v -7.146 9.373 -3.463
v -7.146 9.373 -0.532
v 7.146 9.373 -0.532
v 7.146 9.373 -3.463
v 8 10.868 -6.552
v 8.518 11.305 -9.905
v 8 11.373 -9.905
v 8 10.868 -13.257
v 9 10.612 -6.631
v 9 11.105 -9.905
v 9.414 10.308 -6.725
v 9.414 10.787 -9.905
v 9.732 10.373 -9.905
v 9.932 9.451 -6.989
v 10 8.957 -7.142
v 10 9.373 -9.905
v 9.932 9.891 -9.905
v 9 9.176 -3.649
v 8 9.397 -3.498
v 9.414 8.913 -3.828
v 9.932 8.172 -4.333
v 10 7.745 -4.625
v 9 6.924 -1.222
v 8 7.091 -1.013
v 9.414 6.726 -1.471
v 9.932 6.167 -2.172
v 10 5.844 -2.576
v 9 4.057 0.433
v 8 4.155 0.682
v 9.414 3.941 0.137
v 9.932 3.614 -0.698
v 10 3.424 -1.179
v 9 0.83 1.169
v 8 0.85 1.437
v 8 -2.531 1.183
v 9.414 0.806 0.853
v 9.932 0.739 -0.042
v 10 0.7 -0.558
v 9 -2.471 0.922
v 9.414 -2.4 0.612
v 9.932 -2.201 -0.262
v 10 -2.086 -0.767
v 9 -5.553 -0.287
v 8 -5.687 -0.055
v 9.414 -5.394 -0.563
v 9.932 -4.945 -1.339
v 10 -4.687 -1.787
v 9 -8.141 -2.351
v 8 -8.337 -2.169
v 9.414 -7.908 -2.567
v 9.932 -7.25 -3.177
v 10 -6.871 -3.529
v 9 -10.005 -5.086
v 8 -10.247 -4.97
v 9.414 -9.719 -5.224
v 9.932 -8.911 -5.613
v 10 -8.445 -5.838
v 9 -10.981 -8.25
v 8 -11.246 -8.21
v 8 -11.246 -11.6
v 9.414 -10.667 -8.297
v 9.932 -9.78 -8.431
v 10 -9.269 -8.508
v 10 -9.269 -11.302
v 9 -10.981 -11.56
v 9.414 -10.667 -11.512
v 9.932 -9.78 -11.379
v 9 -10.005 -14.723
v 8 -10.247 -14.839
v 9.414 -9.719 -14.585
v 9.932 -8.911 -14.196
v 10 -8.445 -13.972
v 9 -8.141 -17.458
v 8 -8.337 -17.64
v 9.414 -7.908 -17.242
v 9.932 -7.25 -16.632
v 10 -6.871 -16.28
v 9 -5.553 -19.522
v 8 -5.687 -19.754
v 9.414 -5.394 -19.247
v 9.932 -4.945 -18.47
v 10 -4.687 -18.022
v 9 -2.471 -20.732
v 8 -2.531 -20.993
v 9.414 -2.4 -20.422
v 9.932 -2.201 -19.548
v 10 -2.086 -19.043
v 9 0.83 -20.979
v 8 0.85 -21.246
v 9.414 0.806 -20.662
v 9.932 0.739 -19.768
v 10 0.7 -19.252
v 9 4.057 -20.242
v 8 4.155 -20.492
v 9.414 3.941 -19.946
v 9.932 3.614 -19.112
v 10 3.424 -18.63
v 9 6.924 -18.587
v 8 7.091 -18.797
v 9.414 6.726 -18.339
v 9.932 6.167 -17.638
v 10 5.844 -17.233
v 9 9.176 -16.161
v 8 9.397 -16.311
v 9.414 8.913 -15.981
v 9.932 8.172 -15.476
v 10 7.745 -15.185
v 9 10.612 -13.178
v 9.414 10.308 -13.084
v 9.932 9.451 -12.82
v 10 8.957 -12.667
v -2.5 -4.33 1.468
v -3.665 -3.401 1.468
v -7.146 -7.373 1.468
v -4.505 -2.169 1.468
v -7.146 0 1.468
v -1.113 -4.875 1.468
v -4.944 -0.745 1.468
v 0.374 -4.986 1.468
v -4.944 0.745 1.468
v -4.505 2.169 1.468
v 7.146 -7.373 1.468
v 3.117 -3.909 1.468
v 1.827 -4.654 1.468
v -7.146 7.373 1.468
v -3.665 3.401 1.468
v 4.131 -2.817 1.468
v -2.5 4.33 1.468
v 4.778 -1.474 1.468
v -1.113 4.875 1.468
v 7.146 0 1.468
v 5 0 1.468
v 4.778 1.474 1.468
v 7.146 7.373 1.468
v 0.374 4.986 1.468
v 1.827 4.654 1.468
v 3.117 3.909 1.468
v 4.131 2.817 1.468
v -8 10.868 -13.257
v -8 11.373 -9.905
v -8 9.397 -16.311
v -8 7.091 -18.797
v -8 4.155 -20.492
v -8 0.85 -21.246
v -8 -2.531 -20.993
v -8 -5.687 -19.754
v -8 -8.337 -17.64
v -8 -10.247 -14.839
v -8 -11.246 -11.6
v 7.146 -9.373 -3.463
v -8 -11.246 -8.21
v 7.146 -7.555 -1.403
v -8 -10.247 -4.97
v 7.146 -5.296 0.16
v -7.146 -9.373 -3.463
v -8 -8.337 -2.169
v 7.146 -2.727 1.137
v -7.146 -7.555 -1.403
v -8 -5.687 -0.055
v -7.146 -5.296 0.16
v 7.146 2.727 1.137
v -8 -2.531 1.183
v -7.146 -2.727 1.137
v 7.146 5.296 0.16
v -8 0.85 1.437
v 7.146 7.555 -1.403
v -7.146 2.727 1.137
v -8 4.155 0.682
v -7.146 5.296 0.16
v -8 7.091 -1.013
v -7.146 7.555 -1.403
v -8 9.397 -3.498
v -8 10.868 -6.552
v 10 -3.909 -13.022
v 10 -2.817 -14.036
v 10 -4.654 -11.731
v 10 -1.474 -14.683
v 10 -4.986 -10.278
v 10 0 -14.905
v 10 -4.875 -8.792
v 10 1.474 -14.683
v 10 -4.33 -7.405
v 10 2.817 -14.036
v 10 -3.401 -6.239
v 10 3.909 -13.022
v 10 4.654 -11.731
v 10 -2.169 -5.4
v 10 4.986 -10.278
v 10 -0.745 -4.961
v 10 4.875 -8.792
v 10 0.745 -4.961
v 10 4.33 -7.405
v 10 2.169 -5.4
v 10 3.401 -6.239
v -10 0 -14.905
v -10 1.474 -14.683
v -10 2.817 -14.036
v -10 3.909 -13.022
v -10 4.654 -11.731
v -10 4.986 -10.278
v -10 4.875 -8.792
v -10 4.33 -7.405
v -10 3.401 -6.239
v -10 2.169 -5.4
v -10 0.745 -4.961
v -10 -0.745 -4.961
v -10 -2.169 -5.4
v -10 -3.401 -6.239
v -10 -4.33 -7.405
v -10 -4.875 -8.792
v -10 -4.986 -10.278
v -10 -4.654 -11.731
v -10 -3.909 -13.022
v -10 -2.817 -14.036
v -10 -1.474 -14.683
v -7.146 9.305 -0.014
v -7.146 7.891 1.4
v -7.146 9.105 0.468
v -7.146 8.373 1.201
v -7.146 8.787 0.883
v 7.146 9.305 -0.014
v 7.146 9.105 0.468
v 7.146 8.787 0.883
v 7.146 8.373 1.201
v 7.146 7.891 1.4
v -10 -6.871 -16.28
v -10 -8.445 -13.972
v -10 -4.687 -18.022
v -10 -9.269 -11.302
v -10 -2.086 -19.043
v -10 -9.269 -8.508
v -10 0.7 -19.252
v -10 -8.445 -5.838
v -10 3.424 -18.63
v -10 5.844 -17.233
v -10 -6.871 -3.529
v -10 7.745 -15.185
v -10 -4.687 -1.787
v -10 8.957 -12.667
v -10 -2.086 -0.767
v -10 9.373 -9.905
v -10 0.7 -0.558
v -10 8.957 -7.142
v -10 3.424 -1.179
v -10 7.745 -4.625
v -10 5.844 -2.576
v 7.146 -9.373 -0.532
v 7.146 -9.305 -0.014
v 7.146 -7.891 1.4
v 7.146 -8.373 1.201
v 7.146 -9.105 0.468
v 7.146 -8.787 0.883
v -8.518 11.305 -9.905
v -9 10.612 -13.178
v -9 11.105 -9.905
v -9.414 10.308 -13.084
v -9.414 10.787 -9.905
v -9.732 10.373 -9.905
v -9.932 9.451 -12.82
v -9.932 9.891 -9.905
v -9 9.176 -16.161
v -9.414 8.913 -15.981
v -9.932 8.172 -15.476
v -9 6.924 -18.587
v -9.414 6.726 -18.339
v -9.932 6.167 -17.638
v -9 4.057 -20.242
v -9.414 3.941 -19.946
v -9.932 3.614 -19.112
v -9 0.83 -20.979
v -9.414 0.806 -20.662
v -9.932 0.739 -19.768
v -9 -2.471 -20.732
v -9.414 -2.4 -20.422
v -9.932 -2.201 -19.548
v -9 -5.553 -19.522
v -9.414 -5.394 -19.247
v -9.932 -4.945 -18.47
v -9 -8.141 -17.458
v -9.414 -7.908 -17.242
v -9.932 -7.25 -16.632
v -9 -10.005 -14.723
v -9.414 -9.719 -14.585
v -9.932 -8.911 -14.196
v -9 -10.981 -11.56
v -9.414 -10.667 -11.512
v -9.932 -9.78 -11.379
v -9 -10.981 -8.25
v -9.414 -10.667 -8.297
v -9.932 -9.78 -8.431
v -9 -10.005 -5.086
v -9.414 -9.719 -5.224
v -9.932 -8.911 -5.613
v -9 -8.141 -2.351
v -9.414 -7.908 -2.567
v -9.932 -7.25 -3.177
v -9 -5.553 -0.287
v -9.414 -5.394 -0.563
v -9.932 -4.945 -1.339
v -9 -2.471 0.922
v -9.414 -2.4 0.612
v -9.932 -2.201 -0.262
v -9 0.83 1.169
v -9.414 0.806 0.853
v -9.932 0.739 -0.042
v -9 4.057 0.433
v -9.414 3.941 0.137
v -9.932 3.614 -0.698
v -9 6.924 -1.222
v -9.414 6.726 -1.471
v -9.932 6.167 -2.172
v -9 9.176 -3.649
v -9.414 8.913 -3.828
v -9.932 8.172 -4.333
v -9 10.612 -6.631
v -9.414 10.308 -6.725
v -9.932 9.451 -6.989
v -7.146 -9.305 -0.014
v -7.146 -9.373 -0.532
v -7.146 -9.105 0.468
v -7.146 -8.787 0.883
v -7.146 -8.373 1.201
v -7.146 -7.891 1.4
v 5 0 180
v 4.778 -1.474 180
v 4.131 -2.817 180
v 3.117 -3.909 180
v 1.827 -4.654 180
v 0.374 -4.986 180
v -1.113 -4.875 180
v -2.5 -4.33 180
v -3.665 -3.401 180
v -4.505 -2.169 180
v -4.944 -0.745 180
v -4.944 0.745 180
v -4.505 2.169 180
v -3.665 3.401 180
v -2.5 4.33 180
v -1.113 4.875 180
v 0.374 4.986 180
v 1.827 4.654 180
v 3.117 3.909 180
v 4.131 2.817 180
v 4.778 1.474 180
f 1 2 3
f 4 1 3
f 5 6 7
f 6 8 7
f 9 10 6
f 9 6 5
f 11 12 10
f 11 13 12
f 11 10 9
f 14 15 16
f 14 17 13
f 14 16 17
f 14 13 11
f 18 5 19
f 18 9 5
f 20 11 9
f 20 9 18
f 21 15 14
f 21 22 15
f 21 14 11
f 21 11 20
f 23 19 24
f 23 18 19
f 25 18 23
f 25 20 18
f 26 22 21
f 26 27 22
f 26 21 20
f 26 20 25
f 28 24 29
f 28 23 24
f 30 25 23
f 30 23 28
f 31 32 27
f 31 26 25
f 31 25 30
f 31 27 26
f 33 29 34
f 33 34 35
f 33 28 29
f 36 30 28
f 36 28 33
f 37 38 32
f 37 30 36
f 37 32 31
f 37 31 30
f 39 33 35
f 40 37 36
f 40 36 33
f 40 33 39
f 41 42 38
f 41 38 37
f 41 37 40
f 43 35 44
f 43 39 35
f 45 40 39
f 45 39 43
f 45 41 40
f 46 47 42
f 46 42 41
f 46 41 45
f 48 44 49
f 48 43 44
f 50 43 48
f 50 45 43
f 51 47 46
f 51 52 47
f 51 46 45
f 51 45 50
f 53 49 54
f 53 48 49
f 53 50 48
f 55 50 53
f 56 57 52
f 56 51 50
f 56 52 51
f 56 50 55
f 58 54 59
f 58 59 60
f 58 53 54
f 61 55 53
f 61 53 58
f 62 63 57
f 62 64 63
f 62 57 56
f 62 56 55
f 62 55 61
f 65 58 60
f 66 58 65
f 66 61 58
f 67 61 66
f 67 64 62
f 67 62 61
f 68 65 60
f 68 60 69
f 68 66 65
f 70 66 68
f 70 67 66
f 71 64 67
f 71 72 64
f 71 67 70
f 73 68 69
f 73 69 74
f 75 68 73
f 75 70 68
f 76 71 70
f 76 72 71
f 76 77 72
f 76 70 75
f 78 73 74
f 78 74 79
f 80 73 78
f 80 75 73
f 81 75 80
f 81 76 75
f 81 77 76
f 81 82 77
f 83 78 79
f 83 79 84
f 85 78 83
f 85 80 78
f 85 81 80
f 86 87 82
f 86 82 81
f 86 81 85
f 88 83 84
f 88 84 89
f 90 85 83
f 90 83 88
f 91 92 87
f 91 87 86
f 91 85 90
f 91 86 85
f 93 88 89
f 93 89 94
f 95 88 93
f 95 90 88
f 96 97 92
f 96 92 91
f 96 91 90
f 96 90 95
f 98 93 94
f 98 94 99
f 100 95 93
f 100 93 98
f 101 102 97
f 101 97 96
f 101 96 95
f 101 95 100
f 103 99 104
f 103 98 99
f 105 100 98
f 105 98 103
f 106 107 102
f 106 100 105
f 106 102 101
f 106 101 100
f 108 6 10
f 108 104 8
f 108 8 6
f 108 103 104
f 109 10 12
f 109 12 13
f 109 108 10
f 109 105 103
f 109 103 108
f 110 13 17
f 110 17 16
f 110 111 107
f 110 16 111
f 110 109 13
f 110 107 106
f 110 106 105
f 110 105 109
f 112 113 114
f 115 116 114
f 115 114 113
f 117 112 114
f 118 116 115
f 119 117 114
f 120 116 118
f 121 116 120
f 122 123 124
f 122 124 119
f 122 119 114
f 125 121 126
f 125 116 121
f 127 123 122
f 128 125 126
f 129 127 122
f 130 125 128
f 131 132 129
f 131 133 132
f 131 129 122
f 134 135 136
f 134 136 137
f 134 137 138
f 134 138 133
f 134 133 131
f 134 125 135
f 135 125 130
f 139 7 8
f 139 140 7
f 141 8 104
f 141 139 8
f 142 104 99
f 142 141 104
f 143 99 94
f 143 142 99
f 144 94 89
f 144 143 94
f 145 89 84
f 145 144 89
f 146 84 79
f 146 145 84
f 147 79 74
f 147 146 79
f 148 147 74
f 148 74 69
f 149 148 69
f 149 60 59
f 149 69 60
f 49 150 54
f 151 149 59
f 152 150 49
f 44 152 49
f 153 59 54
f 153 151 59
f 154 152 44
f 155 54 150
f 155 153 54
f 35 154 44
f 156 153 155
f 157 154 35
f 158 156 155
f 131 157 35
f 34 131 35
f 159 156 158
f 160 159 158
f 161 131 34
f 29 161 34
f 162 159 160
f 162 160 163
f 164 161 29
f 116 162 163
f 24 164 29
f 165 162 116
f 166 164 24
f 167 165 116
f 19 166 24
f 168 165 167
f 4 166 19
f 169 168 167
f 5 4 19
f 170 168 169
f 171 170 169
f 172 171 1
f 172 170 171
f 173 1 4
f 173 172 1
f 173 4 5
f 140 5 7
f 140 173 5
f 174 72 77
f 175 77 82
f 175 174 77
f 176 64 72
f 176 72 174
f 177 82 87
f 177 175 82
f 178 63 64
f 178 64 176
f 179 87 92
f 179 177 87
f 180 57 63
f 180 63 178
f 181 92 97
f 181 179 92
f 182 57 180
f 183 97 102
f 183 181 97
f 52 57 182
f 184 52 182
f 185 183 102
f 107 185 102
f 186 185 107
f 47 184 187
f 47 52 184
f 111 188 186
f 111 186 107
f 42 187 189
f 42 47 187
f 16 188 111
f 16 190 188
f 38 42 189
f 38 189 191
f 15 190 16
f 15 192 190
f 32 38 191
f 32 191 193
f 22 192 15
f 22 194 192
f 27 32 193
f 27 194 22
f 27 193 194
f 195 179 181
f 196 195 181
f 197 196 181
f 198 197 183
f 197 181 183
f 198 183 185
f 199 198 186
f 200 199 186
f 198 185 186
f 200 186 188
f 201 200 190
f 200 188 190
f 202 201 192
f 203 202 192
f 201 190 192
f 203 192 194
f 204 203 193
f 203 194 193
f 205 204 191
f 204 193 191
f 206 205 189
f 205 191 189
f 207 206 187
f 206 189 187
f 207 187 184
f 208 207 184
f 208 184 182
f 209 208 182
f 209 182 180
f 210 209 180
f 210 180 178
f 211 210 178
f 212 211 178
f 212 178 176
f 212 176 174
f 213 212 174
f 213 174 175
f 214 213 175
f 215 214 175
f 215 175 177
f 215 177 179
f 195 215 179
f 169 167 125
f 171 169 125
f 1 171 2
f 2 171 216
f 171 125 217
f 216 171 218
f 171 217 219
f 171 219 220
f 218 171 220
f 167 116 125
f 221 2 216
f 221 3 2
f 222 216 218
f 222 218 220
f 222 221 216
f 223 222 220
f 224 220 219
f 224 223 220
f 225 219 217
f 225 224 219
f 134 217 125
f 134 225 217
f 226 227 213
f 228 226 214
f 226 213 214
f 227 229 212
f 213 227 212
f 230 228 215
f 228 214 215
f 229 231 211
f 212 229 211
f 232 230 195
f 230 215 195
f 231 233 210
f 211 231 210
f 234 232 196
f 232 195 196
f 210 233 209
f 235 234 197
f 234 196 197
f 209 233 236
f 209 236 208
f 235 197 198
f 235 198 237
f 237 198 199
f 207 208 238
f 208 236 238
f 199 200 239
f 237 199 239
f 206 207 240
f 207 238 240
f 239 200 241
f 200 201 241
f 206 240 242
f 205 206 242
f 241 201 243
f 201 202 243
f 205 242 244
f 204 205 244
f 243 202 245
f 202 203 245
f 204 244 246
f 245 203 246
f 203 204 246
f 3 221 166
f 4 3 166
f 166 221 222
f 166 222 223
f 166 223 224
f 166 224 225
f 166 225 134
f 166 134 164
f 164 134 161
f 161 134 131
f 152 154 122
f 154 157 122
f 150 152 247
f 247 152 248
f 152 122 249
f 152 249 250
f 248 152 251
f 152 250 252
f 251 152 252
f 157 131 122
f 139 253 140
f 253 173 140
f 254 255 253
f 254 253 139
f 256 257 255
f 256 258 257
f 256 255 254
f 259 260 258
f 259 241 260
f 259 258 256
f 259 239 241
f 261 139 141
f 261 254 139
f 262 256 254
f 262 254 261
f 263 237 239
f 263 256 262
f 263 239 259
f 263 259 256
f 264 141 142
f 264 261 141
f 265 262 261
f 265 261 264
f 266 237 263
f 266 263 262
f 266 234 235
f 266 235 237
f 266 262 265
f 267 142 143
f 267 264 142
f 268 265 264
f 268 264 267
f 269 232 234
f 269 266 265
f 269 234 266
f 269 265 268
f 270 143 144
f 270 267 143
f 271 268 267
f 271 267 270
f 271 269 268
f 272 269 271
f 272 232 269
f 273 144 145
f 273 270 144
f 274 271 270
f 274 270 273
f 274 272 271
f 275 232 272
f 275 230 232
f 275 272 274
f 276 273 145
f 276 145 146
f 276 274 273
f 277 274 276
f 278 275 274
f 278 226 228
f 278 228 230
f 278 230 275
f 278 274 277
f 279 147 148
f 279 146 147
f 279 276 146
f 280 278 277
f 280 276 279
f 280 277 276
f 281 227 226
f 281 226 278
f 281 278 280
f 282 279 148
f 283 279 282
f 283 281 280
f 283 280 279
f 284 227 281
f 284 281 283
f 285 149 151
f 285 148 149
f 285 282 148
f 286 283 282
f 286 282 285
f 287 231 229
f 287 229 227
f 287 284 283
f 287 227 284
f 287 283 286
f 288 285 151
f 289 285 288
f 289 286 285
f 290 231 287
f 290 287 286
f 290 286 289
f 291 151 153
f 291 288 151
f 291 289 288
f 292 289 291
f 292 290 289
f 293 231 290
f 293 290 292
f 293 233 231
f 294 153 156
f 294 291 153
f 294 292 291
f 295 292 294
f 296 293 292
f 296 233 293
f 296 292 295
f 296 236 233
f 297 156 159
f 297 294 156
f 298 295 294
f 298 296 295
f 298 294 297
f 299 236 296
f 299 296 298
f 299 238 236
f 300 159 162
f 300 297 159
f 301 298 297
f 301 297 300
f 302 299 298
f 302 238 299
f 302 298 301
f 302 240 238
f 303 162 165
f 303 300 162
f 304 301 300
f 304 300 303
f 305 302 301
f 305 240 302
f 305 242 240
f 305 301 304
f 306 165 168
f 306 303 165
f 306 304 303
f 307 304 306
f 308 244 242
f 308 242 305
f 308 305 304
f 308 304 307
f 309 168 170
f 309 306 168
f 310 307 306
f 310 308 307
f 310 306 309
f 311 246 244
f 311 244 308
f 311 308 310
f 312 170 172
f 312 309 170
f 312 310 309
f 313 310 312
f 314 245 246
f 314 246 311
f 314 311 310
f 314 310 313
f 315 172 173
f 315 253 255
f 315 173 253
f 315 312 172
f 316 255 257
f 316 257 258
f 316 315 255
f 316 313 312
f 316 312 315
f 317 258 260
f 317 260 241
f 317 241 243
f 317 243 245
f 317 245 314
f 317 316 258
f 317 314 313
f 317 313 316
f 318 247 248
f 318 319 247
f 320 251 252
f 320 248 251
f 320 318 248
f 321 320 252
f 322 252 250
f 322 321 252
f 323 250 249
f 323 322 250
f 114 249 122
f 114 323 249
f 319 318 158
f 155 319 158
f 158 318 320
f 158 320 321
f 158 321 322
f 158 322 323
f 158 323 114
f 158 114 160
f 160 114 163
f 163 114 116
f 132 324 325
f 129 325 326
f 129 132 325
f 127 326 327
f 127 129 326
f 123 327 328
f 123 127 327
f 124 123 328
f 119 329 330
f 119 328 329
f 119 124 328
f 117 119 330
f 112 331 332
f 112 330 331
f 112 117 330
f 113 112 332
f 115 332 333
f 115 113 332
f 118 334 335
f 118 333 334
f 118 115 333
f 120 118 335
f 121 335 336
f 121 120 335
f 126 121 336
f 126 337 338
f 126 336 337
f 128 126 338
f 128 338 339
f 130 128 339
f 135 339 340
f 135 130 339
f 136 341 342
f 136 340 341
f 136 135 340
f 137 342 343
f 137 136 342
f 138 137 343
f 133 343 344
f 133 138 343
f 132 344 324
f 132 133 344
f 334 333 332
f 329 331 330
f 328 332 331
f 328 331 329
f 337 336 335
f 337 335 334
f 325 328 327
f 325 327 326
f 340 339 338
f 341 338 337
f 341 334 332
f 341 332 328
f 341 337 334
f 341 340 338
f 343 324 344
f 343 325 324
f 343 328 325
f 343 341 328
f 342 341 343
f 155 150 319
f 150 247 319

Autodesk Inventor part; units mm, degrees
ref_plane "YZ Plane" through (0, 0, 0) normal (1, 0, 0) x (0, 1, 0)
ref_plane "XZ Plane" through (0, 0, 0) normal (0, 1, 0) x (-1, 0, 0)
sketch "Sketch1" plane through (0, 0, 0) normal (0, 0, 1) x (1, 0, 0)
  circle A0 centre (0, 0) radius 5
  dimension "d0" = 10
extrude "Extrusion1" add sketch "Sketch1" along normal blind 180
thread "Thread1" size "M10x1.5" class "6g" standard "ANSI Metric M Profile" length 160 offset 10
sketch "Sketch2" plane through (0, 0, 0) normal (1, 0, 0) x (0, 1, 0)
  circle A0 centre (0, -9.9047) radius 11.3732
  point P0 (0, 0)
extrude "Extrusion2" add sketch "Sketch2" along normal mid plane 20
sketch "Sketch3" plane through (10, 0, -9.9047) normal (1, 0, 0) x (0, 0, -1)
  circle A0 centre (0, 0) radius 5
  point P0 (-9.9047, 0)
  dimension "d7" = 10
extrude "Extrusion3" cut sketch "Sketch3" against normal blind 20
fillet "Fillet1" radius 2 2 edges at (10, -11.3732, -9.9047) (-10, -11.3732, -9.9047)
ref_plane "Work Plane1" through (0, 0, 1.4685) normal (0, 0, 1) x (1, 0, 0)
sketch "Sketch4" plane through (0, 0, 1.4685) normal (0, 0, 1) x (1, 0, 0)
  line L0 (-7.1456, 9.3732) -> (7.1456, 9.3732)
  line L1 (7.1456, 9.3732) -> (7.1456, -9.3732)
  line L2 (7.1456, -9.3732) -> (-7.1456, -9.3732)
  line L3 (-7.1456, -9.3732) -> (-7.1456, 9.3732)
  line L4 (-7.1456, 9.3732) -> (7.1456, -9.3732) construction
  line L5 (7.1456, 9.3732) -> (-7.1456, -9.3732) construction
  point P0 (0, 0)
extrude "Extrusion4" add sketch "Sketch4" against normal blind 5
fillet "Fillet2" radius 2 2 edges at (0, 9.3732, 1.4685) (0, -9.3732, 1.4685)
properties part number "rod"
